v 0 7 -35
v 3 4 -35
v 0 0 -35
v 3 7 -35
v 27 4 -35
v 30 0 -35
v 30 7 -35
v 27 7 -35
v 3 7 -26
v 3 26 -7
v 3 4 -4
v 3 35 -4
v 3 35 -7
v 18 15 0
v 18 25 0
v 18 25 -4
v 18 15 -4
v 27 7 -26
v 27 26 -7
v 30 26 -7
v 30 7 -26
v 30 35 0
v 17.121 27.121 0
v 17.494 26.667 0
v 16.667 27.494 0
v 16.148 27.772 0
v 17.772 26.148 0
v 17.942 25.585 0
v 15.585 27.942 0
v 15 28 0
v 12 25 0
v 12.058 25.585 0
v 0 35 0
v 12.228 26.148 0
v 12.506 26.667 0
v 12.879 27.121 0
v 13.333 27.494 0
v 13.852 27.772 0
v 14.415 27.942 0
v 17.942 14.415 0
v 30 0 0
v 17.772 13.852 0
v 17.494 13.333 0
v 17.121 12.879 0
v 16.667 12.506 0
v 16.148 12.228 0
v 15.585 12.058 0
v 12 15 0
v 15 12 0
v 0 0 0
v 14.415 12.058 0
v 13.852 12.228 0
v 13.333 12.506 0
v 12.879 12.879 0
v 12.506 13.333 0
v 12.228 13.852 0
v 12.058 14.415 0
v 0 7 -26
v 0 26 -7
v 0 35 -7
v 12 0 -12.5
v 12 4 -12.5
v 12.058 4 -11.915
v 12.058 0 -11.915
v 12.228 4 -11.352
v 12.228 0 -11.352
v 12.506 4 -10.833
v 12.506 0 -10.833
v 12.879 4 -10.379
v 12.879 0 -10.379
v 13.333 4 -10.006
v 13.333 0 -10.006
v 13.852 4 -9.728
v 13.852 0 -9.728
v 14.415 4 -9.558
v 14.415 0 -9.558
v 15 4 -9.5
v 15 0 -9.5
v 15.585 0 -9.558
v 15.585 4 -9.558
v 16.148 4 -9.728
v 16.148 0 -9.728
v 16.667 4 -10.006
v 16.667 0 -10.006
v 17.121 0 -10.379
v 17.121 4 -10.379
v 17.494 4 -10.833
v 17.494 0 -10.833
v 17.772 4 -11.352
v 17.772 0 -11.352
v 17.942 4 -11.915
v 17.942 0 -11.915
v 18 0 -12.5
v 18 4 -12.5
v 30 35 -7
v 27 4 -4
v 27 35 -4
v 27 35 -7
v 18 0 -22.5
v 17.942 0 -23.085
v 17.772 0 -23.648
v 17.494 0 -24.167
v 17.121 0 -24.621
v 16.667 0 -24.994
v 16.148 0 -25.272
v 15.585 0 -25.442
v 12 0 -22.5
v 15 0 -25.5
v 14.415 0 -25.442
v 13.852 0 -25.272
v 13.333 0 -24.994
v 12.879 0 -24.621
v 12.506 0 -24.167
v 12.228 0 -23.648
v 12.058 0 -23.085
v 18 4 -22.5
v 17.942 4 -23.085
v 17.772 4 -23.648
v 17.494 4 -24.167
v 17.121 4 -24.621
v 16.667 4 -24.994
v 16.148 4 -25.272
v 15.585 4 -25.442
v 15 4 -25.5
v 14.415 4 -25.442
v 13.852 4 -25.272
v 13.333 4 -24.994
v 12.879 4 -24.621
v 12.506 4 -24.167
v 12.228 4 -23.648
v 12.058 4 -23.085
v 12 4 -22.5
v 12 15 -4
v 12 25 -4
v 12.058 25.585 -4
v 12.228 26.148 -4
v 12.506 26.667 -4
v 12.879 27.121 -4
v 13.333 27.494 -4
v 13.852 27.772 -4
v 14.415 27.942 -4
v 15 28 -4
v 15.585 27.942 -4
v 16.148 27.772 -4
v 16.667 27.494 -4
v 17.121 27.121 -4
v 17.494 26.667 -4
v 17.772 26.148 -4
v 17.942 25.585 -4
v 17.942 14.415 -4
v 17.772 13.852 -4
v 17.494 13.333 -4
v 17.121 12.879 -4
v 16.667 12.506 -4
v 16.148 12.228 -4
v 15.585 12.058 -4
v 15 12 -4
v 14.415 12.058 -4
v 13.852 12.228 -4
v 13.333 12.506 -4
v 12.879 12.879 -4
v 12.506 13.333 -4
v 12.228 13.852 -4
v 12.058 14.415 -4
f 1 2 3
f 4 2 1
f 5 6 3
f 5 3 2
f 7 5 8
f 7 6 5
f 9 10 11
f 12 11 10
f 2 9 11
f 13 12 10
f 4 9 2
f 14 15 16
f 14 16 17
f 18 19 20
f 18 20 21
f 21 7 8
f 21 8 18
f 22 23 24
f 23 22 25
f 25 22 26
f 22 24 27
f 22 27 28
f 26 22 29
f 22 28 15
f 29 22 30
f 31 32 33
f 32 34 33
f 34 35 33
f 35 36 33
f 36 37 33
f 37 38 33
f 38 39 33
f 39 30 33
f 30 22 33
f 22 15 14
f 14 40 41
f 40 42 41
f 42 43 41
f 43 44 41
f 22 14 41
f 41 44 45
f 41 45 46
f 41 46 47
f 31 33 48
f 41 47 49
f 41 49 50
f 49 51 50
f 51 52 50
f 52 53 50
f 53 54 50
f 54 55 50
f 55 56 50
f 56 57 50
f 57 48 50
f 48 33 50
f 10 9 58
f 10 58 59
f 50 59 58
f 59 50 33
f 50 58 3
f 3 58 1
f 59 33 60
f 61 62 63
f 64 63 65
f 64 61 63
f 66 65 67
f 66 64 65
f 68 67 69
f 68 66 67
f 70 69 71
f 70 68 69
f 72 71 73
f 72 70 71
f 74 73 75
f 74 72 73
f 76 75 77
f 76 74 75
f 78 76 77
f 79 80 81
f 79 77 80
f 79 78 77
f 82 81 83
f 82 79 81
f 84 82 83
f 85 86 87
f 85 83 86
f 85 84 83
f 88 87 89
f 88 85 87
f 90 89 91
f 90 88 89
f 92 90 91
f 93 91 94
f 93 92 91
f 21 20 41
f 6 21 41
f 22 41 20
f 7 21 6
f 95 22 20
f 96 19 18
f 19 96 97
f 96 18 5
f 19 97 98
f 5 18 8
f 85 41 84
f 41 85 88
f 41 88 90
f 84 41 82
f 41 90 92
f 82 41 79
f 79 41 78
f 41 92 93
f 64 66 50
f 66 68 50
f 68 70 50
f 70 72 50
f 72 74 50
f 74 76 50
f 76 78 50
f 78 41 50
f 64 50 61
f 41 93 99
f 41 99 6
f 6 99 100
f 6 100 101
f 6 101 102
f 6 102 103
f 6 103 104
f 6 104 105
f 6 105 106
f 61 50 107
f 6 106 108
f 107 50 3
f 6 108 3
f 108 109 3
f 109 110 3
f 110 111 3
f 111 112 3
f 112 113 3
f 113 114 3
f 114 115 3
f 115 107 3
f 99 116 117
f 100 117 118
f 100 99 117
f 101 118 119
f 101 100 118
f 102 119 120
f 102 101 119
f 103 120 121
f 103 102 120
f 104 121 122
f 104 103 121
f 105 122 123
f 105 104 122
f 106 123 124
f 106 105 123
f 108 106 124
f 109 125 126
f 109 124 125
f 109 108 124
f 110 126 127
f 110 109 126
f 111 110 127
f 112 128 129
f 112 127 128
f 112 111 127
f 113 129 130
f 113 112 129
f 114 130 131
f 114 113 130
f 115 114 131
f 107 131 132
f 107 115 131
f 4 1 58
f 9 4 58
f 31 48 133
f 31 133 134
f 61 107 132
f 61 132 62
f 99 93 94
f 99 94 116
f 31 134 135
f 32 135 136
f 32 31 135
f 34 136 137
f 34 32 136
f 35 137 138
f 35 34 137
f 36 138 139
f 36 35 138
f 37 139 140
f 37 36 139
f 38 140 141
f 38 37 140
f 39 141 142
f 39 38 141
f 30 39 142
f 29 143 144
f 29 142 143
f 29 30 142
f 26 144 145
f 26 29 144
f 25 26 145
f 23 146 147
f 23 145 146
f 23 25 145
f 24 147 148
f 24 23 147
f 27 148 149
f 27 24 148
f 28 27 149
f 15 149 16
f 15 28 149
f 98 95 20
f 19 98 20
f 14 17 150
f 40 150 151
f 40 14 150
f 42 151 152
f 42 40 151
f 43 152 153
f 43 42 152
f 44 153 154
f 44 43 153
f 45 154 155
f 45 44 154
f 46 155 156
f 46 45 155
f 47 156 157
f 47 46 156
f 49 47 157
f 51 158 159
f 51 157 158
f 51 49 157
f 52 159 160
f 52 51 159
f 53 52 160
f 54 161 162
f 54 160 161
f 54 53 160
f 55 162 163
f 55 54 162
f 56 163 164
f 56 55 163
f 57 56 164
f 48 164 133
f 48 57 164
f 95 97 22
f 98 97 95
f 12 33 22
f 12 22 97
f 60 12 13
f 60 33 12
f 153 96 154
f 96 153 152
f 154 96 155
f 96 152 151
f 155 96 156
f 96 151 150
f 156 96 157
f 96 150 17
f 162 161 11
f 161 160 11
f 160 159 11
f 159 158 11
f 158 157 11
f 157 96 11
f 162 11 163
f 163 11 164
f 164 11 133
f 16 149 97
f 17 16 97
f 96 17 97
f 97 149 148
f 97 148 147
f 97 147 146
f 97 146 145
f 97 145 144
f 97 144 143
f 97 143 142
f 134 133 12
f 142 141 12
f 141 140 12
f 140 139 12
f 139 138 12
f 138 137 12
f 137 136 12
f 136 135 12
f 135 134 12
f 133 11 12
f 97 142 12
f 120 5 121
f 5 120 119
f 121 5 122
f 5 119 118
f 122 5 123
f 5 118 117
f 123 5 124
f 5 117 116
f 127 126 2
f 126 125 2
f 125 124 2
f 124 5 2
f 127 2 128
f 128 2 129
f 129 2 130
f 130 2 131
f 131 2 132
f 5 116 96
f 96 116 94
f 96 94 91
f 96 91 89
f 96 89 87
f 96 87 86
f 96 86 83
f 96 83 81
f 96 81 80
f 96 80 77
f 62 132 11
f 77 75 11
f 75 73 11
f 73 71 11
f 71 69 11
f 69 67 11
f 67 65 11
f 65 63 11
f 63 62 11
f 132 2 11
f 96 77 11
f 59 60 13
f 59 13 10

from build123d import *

# Parameters (mm, degrees)
BOSS_EXTRUDE1_DEPTH = 30
GUSSET1_THICKNESS   = 3
GUSSET2_THICKNESS   = 3
BOSS_EXTRUDE2_DEPTH = 3
BOSS_EXTRUDE3_DEPTH = 3
BOSS_EXTRUDE4_DEPTH = 3
BOSS_EXTRUDE5_DEPTH = 3
CUT_EXTRUDE1_DEPTH  = 58.879184514
CUT_EXTRUDE2_DEPTH  = 13


with BuildPart() as part:
    # Sketch2 → Boss-Extrude1 (new body)
    with BuildSketch(Plane(origin=(0, 0, 0), x_dir=(0, 0, -1), z_dir=(1, 0, 0))):
        Polygon((0, 35), (0, 0), (35, 0), (35, 4), (4, 4), (4, 35), align=None)
    extrude(amount=BOSS_EXTRUDE1_DEPTH)



with BuildPart() as body_2:
    # Gusset1: a gusset: a plate 3.0 thick in the corner of two members, its outline drawn in place
    gusset1_outline = Wire([Line((27, 4, -4), (27, 29, -4)), Line((27, 29, -4), (27, 4, -29)), Line((27, 4, -29), (27, 4, -4))])
    add(extrude(Face(gusset1_outline), amount=GUSSET1_THICKNESS, dir=(1, 0, 0)))


with BuildPart() as body_3:
    # Gusset2: a gusset: a plate 3.0 thick in the corner of two members, its outline drawn in place
    gusset2_outline = Wire([Line((3, 4, -4), (3, 4, -29)), Line((3, 4, -29), (3, 29, -4)), Line((3, 29, -4), (3, 4, -4))])
    add(extrude(Face(gusset2_outline), amount=GUSSET2_THICKNESS, dir=(-1, 0, 0)))


with BuildPart() as part_1:
    add(part.part)

    add(body_2.part)  # Boss-Extrude2 merges body 2
    # Sketch7 → Boss-Extrude2 (add)
    with BuildSketch(Plane(origin=(30, 0, 0), x_dir=(0, 0, -1), z_dir=(1, 0, 0))):
        Polygon((4, 35), (7, 35), (7, 26), (4, 29), align=None)
    extrude(amount=-BOSS_EXTRUDE2_DEPTH)


    add(body_3.part)  # Boss-Extrude3 merges body 3
    # Sketch8 → Boss-Extrude3 (add)
    with BuildSketch(Plane.ZY):
        Polygon((-4, 35), (-7, 35), (-7, 26), (-4, 29), align=None)
    extrude(amount=-BOSS_EXTRUDE3_DEPTH)

    # Sketch9 → Boss-Extrude4 (add)
    with BuildSketch(Plane.ZY):
        Polygon((-35, 4), (-35, 7), (-26, 7), (-29, 4), align=None)
    extrude(amount=-BOSS_EXTRUDE4_DEPTH)

    # Sketch10 → Boss-Extrude5 (add)
    with BuildSketch(Plane(origin=(30, 0, 0), x_dir=(0, 0, -1), z_dir=(1, 0, 0))):
        Polygon((35, 4), (35, 7), (26, 7), (29, 4), align=None)
    extrude(amount=-BOSS_EXTRUDE5_DEPTH)

    # Sketch11 → Cut-Extrude1 (cut, through all)
    with BuildSketch(Plane.XY):
        with BuildLine():
            Line((12, 15), (12, 25))
            ThreePointArc((12, 25), (15, 28), (18, 25))
            Line((18, 25), (18, 15))
            ThreePointArc((18, 15), (15, 12), (12, 15))
        make_face()
    extrude(amount=-CUT_EXTRUDE1_DEPTH, mode=Mode.SUBTRACT)

    # Sketch12 → Cut-Extrude2 (cut)
    with BuildSketch(Plane.XZ):
        with BuildLine():
            Line((12, -22.5), (12, -12.5))
            ThreePointArc((12, -12.5), (15, -9.5), (18, -12.5))
            Line((18, -12.5), (18, -22.5))
            ThreePointArc((18, -22.5), (15, -25.5), (12, -22.5))
        make_face()
    extrude(amount=-CUT_EXTRUDE2_DEPTH, mode=Mode.SUBTRACT)


solid = part_1.part
